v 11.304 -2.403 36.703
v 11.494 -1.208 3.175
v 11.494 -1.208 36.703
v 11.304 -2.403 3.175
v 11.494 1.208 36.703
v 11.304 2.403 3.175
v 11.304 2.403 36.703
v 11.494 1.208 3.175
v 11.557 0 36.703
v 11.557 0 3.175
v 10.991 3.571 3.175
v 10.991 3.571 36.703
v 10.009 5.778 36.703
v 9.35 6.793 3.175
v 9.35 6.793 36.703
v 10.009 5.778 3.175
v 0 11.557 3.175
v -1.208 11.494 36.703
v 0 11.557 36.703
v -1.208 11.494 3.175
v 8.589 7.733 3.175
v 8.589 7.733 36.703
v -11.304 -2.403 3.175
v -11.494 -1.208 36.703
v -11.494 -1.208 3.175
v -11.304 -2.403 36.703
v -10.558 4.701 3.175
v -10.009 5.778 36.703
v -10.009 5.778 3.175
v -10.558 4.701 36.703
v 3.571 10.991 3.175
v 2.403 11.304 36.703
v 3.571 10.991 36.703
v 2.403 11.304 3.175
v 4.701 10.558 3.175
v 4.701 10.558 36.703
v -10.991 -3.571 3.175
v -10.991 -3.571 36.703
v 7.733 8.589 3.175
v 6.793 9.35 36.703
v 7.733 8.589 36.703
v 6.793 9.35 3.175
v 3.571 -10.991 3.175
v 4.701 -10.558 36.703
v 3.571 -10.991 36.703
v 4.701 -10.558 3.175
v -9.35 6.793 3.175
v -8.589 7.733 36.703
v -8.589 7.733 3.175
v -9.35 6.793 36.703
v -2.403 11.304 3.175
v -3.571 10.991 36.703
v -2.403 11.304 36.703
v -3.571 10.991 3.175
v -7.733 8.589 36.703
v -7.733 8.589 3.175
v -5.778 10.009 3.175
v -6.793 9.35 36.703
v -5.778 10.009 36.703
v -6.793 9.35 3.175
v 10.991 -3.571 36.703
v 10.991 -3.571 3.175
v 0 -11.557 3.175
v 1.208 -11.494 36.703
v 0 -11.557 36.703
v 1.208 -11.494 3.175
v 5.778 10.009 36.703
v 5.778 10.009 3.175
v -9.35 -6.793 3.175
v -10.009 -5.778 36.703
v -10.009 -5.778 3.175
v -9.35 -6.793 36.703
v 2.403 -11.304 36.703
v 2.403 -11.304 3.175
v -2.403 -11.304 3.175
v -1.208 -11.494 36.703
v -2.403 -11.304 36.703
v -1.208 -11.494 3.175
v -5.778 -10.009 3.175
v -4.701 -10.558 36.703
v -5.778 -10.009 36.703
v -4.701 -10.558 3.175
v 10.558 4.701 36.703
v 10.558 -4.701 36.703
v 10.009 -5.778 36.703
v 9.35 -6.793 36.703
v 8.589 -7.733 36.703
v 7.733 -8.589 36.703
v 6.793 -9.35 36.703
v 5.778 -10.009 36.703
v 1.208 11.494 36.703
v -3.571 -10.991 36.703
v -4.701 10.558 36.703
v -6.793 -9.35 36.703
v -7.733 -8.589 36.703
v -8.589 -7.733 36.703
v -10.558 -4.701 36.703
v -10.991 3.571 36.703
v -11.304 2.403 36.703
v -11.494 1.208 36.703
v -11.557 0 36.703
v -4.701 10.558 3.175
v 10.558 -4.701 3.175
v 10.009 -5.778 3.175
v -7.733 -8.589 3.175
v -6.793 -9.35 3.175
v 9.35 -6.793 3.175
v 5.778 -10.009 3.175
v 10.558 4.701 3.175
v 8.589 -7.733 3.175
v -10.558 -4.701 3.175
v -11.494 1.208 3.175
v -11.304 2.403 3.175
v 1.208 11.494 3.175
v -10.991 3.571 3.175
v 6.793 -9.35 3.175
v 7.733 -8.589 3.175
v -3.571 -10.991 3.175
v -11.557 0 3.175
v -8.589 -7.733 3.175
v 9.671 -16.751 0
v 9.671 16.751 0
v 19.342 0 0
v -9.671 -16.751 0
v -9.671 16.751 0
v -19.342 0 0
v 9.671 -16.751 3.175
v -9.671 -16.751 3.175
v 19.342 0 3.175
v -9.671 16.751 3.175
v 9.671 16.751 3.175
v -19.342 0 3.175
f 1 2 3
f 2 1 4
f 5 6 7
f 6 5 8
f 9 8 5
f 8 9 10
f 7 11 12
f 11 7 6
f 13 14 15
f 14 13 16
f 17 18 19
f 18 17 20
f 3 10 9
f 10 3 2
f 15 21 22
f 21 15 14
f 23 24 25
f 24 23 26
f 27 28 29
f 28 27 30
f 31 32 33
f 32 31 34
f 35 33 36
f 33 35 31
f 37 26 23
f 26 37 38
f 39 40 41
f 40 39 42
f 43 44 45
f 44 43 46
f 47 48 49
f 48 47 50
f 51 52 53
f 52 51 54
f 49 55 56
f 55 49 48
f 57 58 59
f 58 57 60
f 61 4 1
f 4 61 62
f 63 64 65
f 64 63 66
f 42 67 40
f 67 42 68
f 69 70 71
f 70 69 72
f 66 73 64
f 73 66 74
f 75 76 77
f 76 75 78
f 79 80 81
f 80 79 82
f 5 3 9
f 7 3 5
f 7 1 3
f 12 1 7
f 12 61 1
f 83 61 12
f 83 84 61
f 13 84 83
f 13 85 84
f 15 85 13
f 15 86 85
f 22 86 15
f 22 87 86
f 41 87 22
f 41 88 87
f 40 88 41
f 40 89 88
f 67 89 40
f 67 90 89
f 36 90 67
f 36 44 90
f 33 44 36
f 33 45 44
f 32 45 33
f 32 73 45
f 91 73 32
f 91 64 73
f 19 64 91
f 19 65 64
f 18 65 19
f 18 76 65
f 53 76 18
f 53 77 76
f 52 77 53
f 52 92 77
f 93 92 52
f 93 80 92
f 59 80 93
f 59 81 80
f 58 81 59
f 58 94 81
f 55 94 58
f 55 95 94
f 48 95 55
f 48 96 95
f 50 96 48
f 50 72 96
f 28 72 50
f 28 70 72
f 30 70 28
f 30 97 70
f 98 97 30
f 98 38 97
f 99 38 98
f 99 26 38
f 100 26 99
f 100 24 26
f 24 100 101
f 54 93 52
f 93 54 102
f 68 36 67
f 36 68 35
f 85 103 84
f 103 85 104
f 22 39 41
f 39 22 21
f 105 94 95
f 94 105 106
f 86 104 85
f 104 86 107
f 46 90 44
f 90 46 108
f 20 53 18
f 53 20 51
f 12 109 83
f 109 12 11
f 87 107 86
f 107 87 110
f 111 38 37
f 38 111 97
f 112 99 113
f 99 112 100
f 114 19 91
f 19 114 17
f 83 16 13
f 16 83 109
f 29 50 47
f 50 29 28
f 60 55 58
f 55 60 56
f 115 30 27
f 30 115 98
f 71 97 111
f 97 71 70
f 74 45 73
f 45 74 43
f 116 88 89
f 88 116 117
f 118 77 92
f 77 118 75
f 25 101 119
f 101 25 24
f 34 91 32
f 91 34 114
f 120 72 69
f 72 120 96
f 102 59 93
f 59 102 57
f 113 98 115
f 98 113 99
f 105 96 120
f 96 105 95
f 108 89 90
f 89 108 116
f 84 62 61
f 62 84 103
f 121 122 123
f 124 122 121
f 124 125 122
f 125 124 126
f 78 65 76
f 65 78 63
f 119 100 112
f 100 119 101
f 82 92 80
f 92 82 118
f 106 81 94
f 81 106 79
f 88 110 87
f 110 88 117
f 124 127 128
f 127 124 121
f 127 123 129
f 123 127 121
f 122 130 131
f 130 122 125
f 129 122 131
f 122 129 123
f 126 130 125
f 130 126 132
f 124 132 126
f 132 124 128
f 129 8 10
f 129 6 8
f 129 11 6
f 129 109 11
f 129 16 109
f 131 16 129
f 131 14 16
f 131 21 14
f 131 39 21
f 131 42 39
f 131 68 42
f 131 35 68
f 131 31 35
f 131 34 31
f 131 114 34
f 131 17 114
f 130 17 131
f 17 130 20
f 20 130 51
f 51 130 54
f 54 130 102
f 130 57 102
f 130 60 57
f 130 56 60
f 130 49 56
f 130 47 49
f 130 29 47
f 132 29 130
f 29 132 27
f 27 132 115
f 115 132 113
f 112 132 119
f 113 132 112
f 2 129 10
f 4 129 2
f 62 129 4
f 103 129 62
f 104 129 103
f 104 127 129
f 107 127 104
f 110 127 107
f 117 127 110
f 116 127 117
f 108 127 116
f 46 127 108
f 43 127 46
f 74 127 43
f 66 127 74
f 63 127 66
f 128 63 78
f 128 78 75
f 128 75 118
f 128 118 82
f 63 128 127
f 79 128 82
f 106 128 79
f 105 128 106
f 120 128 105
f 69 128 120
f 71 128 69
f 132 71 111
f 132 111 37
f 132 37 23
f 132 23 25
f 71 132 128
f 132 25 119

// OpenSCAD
// file: Vitamins/Rod.scad
// 1/8" Rod
1_8_rod_d         = 1/8;
1_8_rod_r         = 1_8_rod_d/2;
1_8_rod_clearance = 0.03; // TODO

// 1/4" Rod
1_4_rod_d                = 1/4;
1_4_rod_r                = 1_4_rod_d/2;
1_4_rod_clearance        = 0.02; // TODO
1_4_rod_collar_d         = 1/2;
1_4_rod_collar_width     = 0.27;
1_4_rod_collar_clearance = 0.0; // TODO

// 5/16" Rod
5_16_rod_d         = 5/16;
5_16_rod_r         = 5_16_rod_d/2;
5_16_rod_clearance = 0.02; // TODO

module rod(diameter=1, length=1, clearance=0, cutter=false, $fn=20) {
  if (cutter) {
    cylinder(r=(diameter+clearance)/2, h=length);
  } else {
    cylinder(r=diameter/2, h=length);
  }
}

module 1_8_rod(length=1, cutter=false) {
  rod(diameter=1_8_rod_d, clearance=1_8_rod_clearance, length=length, cutter=cutter);
}

module 1_4_rod(length=1, cutter=false) {
  rod(diameter=1_4_rod_d, clearance=1_4_rod_clearance, length=length, cutter=cutter);
}

module 1_4_rod_collar(cutter=false) {
  rod(diameter=1_4_rod_collar_d, clearance=1_4_rod_collar_clearance, cutter=cutter, length=1_4_rod_collar_width);
}

module 5_16_rod(length=1, cutter=false) {
  rod(diameter=5_16_rod_d, clearance=5_16_rod_clearance, length=length, cutter=cutter);
}
// file: Vitamins/Angle Stock.scad
3_4_angle_stock_width                     = 3/4;
3_4_angle_stock_thickness                 = 0.13;
3_4_angle_stock_trough                    = 0.235; // Thickness across the "elbow" of the angle
3_4_angle_stock_height                    = 0.574;
3_4_angle_stock_width_clearance           = 0.008;
3_4_angle_stock_width_clearance_loose     = 0.008;
3_4_angle_stock_thickness_clearance       = 0.005;
3_4_angle_stock_thickness_clearance_loose = 0.007;

module 3_4_angle_stock(length=1, cutter=false, loose=false) {
  width_clearance     = loose ? 3_4_angle_stock_width_clearance_loose     : 3_4_angle_stock_width_clearance;
  thickness_clearance = loose ? 3_4_angle_stock_thickness_clearance_loose : 3_4_angle_stock_thickness_clearance;

  union() {
    if (cutter) {
      translate([-width_clearance,-thickness_clearance,0])
      cube([3_4_angle_stock_width     + width_clearance*2,
            3_4_angle_stock_thickness + thickness_clearance*2,
            length]);

      translate([-width_clearance,-thickness_clearance,0])
      cube([3_4_angle_stock_thickness + thickness_clearance*2,
            3_4_angle_stock_width     + width_clearance*2,
            length]);

      translate([3_4_angle_stock_thickness/2, 3_4_angle_stock_thickness/2, 0])
      difference() {
        cube([3_4_angle_stock_trough + thickness_clearance/2,
              3_4_angle_stock_trough + thickness_clearance/2,
              length]);

        translate([3_4_angle_stock_trough + thickness_clearance/2,
                   thickness_clearance/2,
                   -0.1])
        rotate([0,0,45])
        cube([3_4_angle_stock_trough*sqrt(2),
              3_4_angle_stock_trough*sqrt(2),
              length + 0.2]);
      }

    } else {
      cube([3_4_angle_stock_width,3_4_angle_stock_thickness,length]);
      cube([3_4_angle_stock_thickness,3_4_angle_stock_width,length]);

      translate([3_4_angle_stock_thickness, 3_4_angle_stock_thickness, 0])
      difference() {
        cube([3_4_angle_stock_trough, 3_4_angle_stock_trough,length]);

        translate([3_4_angle_stock_trough,0,-0.1])
        rotate([0,0,45])
        cube([3_4_angle_stock_trough*sqrt(2), 3_4_angle_stock_trough*sqrt(2),length + 0.2]);
      }
    }
  };
}
// file: Math/Triangles.scad
// Pythagorean Theorem
function pyth_A_B(a,b) = sqrt(pow(a, 2) + pow(b, 2));
function pyth_A_C(a,c) = sqrt(pow(c, 2) - pow(a, 2));
function pyth_B_C(b,c) = sqrt(pow(c, 2) - pow(b, 2));

// Heron's Formula for Triangle Area
function heron_triangle_area(a,b,c) = sqrt(
    ((a+b+c)/2)
    * (((a+b+c)/2) - a)
    * (((a+b+c)/2) - b)
    * (((a+b+c)/2) - c)
  );

function heron_triangle_height(a,b,c) = 2 * heron_triangle_area(a,b,c) / c;
// file: Vitamins/Pipe.scad
//
// Pipe dimensions
//

// 1/8" Pipe
1_8_pipe_od = 0.415;
1_8_pipe_id = 0.265;

// 3/4" Pipe
3_4_pipe_id              = 0.81;
3_4_pipe_od              = 1.05;
3_4_pipe_tapered_od      = 1.018;
3_4_pipe_thread_length   = 0.9;
3_4_pipe_depth           = 0.5; // Depth when fully screwed into a fitting
3_4_pipe_clearance       = 0.015;
3_4_pipe_clearance_loose = 0.027;
3_4_pipe_wall            = (3_4_pipe_od - 3_4_pipe_id)/2;

// 1" Pipe
1_pipe_id              = 1.06;
1_pipe_od              = 1.325;
1_pipe_tapered_od      = 1.285;  // Threaded portion of the pipe, smallest OD
1_pipe_thread_length   = 0.982;  // Length of the threads, measured from the end of the pipe to the last thread mark
1_pipe_clearance       = 0.02;
1_pipe_clearance_loose = 0.03;
1_pipe_wall            = (1_pipe_od - 1_pipe_id)/2;

// 3/4" Tee
3_4_tee_diameter  = 1.38; // Diameter of the body, behind the rim
3_4_tee_width     = 2.64; // Across the top of the T
3_4_tee_height    = 2.01; // From the middle of the bottom rim to the top of the body
3_4_tee_id        = 0.91;
3_4_tee_rim_od    = 1.523;
3_4_tee_rim_width = 0.37;
3_4_tee_center_z  = 3_4_tee_height - (3_4_tee_diameter/2); // Centerline of the T
3_4_tee_rim_z_min = 3_4_tee_center_z - (3_4_tee_rim_od/2); // Bottom of the T rims
3_4_tee_rim_z_max = 3_4_tee_center_z + (3_4_tee_rim_od/2); // Top of the T rims

// 3/4" x 1/8" Bushing
3_4_x_1_8_bushing_height      = 0.95;
3_4_x_1_8_bushing_id          = 0.45;
3_4_x_1_8_bushing_od          = 1.0;
3_4_x_1_8_bushing_head_height = 0.22;
3_4_x_1_8_bushing_head_od     = 1.215;
3_4_x_1_8_bushing_head_id     = 1.06;
3_4_x_1_8_bushing_depth       = 0.5;

module bushing(id, od, height, head_major_width, head_height) {
  difference() {
    union() {

      // Body
      translate([0,0,head_height/2])
      cylinder(r=od/2, h=height - (head_height/2));

      // Head
      cylinder(r=head_major_width/2, h=head_height, $fn=6);
    }

    // Hole
    translate([0,0,-1])
    cylinder(r=id/2, h=height + 2);
  }
};

module pipe(id=1, od=2, length=1, hollow=true, cutter=false, clearance=0.1) {
  difference() {

    // Create the pipe wall
    if (cutter) {
      cylinder(r=(od + clearance)/2, h=length);
    } else {
      cylinder(r=od/2, h=length);
    }

    // Hollow it out
    if (hollow) {
      translate([0,0,-1])
      cylinder(r=id/2, h=length + 2);
    }
  }
};

module 3_4_pipe(length=1, hollow=true, cutter=false, loose=false) {
  clearance = loose ? 3_4_pipe_clearance_loose : 3_4_pipe_clearance;

  pipe(id=3_4_pipe_id, od=3_4_pipe_od, clearance=clearance,
       length=length, hollow=hollow, cutter=cutter);
};

module 1_pipe(length=1, hollow=true, cutter=false, loose=false) {
  clearance = loose ? 1_pipe_clearance_loose : 1_pipe_clearance;

  pipe(id=1_pipe_id, od=1_pipe_od, clearance=clearance,
       length=length, hollow=hollow, cutter=cutter);
};

module pipe_sleeve(length=1,wall=1,hole=1, clearance=0) {
  difference() {
    cylinder(r=hole/2 + wall, h=length);

    translate([0,0,-0.1])
    cylinder(r=hole/2 + clearance, h=length + 0.2);
  }
};

module 3_4_pipe_sleeve(length=1,wall=1) {
  pipe_sleeve(hole=3_4_pipe_od, length = length, wall = wall, clearance = 3_4_pipe_clearance);
};

module 1_pipe_sleeve(length=1,wall=1) {
  pipe_sleeve(hole=1_pipe_od, length = length, wall = wall, clearance = 1_pipe_clearance);
};

module nested_pipe_sleeve(minor_id=1, minor_length=1, major_id=2, major_length=2, minor_clearance=0, major_clearance=0, wall=1) {
    difference() {
      cylinder(r=major_id/2 + wall, h=minor_length + major_length);

      // Minor Hole
      translate([0,0,-0.1])
      cylinder(r=(minor_id+minor_clearance)/2, h=minor_length + 0.2);

      // Major Hole (1" pipe)
      translate([0,0,minor_length])
      cylinder(r=(major_id+major_clearance)/2, h=major_length + 0.1);
    }
}

module 134_nested_pipe_sleeve(major_length = 2, minor_length=1, wall=1) {
  nested_pipe_sleeve(minor_id=3_4_pipe_od, major_id=1_pipe_od,
                     minor_clearance=3_4_pipe_clearance, major_clearance=1_pipe_clearance,
                     minor_length=minor_length, major_length=major_length, wall=wall);
}

module 1_pipe_tapered(length=2) {
  union() {

    // Thread taper
    rotate([0,90,0])
    color("Orange")
    cylinder(r=1_pipe_tapered_od/2, r2=1_pipe_od/2, h=1_pipe_thread_length);

    // Extra pipe length
    translate([1_pipe_thread_length,0,0])
    rotate([0,90,0])
    color("Blue")
    cylinder(r=1_pipe_od/2, h=length - 1_pipe_thread_length);
  }
};

module tee(width, height, od, id, rim_od, rim_width, cutout = false) {
  difference() {
    union() {

      // T-Top
      rotate([0,-90,0])
      translate([height - (od/2),0,0])
      cylinder(r=od/2, h=width * 0.99, center=true);

      // T-Bottom
      translate([0,0,(height - (od/2)) * 0.01])
      cylinder(r=od/2, h=(height - (od/2)) * 0.98);

      // Bottom rim
      cylinder(r=rim_od/2, h=rim_width);

      // Left rim
      rotate([0,90,0])
      translate([-(height - (od/2)),0,-width/2])
      cylinder(r=rim_od/2, h=rim_width);

      // Right rim
      rotate([0,-90,0])
      translate([height - (od/2),0,-width/2])
      cylinder(r=rim_od/2, h=rim_width);
    }

    // Top Hole
    rotate([0,-90,0])
    translate([height - (od/2),0,0])
    cylinder(r=id/2, h=width * 1.05, center=true);

    // Bottom Hole
    translate([0,0,-height * 0.01])
    cylinder(r=id/2, h=height - (od/2) * 1.01);

    // Cutout
    if (cutout) {
       translate([-width/1.8,-od,-height*0.05])
      cube([width * 1.1, od * 1.1, height * 1.1]);
    }
  }
};

module 3_4_tee(width=3_4_tee_width,
               height=3_4_tee_height,
               od=3_4_tee_diameter,
               id=0,
               rim_od=3_4_tee_rim_od,
               rim_width=3_4_tee_rim_width,
               cutout=false) {
  $fn = 30;

  tee(width=width,
       height=height,
       od=od,
       id=id,
       rim_od=rim_od,
       rim_width=rim_width,
       cutout=cutout);
};


*3_4_tee();


scale([25.4, 25.4, 25.4])
*3_4_pipe_sleeve(wall=1/8, length=1/2, $fn=30);
// main file
include <Vitamins/Pipe.scad>;
include <Components.scad>;

scale([25.4, 25.4, 25.4]) {
  union() {
    cylinder(r=3_4_tee_id/2, h=centerline_z + 1/8);

    cylinder(r=3_4_tee_rim_od/2, h=1/8, $fn=6);
  }
}
